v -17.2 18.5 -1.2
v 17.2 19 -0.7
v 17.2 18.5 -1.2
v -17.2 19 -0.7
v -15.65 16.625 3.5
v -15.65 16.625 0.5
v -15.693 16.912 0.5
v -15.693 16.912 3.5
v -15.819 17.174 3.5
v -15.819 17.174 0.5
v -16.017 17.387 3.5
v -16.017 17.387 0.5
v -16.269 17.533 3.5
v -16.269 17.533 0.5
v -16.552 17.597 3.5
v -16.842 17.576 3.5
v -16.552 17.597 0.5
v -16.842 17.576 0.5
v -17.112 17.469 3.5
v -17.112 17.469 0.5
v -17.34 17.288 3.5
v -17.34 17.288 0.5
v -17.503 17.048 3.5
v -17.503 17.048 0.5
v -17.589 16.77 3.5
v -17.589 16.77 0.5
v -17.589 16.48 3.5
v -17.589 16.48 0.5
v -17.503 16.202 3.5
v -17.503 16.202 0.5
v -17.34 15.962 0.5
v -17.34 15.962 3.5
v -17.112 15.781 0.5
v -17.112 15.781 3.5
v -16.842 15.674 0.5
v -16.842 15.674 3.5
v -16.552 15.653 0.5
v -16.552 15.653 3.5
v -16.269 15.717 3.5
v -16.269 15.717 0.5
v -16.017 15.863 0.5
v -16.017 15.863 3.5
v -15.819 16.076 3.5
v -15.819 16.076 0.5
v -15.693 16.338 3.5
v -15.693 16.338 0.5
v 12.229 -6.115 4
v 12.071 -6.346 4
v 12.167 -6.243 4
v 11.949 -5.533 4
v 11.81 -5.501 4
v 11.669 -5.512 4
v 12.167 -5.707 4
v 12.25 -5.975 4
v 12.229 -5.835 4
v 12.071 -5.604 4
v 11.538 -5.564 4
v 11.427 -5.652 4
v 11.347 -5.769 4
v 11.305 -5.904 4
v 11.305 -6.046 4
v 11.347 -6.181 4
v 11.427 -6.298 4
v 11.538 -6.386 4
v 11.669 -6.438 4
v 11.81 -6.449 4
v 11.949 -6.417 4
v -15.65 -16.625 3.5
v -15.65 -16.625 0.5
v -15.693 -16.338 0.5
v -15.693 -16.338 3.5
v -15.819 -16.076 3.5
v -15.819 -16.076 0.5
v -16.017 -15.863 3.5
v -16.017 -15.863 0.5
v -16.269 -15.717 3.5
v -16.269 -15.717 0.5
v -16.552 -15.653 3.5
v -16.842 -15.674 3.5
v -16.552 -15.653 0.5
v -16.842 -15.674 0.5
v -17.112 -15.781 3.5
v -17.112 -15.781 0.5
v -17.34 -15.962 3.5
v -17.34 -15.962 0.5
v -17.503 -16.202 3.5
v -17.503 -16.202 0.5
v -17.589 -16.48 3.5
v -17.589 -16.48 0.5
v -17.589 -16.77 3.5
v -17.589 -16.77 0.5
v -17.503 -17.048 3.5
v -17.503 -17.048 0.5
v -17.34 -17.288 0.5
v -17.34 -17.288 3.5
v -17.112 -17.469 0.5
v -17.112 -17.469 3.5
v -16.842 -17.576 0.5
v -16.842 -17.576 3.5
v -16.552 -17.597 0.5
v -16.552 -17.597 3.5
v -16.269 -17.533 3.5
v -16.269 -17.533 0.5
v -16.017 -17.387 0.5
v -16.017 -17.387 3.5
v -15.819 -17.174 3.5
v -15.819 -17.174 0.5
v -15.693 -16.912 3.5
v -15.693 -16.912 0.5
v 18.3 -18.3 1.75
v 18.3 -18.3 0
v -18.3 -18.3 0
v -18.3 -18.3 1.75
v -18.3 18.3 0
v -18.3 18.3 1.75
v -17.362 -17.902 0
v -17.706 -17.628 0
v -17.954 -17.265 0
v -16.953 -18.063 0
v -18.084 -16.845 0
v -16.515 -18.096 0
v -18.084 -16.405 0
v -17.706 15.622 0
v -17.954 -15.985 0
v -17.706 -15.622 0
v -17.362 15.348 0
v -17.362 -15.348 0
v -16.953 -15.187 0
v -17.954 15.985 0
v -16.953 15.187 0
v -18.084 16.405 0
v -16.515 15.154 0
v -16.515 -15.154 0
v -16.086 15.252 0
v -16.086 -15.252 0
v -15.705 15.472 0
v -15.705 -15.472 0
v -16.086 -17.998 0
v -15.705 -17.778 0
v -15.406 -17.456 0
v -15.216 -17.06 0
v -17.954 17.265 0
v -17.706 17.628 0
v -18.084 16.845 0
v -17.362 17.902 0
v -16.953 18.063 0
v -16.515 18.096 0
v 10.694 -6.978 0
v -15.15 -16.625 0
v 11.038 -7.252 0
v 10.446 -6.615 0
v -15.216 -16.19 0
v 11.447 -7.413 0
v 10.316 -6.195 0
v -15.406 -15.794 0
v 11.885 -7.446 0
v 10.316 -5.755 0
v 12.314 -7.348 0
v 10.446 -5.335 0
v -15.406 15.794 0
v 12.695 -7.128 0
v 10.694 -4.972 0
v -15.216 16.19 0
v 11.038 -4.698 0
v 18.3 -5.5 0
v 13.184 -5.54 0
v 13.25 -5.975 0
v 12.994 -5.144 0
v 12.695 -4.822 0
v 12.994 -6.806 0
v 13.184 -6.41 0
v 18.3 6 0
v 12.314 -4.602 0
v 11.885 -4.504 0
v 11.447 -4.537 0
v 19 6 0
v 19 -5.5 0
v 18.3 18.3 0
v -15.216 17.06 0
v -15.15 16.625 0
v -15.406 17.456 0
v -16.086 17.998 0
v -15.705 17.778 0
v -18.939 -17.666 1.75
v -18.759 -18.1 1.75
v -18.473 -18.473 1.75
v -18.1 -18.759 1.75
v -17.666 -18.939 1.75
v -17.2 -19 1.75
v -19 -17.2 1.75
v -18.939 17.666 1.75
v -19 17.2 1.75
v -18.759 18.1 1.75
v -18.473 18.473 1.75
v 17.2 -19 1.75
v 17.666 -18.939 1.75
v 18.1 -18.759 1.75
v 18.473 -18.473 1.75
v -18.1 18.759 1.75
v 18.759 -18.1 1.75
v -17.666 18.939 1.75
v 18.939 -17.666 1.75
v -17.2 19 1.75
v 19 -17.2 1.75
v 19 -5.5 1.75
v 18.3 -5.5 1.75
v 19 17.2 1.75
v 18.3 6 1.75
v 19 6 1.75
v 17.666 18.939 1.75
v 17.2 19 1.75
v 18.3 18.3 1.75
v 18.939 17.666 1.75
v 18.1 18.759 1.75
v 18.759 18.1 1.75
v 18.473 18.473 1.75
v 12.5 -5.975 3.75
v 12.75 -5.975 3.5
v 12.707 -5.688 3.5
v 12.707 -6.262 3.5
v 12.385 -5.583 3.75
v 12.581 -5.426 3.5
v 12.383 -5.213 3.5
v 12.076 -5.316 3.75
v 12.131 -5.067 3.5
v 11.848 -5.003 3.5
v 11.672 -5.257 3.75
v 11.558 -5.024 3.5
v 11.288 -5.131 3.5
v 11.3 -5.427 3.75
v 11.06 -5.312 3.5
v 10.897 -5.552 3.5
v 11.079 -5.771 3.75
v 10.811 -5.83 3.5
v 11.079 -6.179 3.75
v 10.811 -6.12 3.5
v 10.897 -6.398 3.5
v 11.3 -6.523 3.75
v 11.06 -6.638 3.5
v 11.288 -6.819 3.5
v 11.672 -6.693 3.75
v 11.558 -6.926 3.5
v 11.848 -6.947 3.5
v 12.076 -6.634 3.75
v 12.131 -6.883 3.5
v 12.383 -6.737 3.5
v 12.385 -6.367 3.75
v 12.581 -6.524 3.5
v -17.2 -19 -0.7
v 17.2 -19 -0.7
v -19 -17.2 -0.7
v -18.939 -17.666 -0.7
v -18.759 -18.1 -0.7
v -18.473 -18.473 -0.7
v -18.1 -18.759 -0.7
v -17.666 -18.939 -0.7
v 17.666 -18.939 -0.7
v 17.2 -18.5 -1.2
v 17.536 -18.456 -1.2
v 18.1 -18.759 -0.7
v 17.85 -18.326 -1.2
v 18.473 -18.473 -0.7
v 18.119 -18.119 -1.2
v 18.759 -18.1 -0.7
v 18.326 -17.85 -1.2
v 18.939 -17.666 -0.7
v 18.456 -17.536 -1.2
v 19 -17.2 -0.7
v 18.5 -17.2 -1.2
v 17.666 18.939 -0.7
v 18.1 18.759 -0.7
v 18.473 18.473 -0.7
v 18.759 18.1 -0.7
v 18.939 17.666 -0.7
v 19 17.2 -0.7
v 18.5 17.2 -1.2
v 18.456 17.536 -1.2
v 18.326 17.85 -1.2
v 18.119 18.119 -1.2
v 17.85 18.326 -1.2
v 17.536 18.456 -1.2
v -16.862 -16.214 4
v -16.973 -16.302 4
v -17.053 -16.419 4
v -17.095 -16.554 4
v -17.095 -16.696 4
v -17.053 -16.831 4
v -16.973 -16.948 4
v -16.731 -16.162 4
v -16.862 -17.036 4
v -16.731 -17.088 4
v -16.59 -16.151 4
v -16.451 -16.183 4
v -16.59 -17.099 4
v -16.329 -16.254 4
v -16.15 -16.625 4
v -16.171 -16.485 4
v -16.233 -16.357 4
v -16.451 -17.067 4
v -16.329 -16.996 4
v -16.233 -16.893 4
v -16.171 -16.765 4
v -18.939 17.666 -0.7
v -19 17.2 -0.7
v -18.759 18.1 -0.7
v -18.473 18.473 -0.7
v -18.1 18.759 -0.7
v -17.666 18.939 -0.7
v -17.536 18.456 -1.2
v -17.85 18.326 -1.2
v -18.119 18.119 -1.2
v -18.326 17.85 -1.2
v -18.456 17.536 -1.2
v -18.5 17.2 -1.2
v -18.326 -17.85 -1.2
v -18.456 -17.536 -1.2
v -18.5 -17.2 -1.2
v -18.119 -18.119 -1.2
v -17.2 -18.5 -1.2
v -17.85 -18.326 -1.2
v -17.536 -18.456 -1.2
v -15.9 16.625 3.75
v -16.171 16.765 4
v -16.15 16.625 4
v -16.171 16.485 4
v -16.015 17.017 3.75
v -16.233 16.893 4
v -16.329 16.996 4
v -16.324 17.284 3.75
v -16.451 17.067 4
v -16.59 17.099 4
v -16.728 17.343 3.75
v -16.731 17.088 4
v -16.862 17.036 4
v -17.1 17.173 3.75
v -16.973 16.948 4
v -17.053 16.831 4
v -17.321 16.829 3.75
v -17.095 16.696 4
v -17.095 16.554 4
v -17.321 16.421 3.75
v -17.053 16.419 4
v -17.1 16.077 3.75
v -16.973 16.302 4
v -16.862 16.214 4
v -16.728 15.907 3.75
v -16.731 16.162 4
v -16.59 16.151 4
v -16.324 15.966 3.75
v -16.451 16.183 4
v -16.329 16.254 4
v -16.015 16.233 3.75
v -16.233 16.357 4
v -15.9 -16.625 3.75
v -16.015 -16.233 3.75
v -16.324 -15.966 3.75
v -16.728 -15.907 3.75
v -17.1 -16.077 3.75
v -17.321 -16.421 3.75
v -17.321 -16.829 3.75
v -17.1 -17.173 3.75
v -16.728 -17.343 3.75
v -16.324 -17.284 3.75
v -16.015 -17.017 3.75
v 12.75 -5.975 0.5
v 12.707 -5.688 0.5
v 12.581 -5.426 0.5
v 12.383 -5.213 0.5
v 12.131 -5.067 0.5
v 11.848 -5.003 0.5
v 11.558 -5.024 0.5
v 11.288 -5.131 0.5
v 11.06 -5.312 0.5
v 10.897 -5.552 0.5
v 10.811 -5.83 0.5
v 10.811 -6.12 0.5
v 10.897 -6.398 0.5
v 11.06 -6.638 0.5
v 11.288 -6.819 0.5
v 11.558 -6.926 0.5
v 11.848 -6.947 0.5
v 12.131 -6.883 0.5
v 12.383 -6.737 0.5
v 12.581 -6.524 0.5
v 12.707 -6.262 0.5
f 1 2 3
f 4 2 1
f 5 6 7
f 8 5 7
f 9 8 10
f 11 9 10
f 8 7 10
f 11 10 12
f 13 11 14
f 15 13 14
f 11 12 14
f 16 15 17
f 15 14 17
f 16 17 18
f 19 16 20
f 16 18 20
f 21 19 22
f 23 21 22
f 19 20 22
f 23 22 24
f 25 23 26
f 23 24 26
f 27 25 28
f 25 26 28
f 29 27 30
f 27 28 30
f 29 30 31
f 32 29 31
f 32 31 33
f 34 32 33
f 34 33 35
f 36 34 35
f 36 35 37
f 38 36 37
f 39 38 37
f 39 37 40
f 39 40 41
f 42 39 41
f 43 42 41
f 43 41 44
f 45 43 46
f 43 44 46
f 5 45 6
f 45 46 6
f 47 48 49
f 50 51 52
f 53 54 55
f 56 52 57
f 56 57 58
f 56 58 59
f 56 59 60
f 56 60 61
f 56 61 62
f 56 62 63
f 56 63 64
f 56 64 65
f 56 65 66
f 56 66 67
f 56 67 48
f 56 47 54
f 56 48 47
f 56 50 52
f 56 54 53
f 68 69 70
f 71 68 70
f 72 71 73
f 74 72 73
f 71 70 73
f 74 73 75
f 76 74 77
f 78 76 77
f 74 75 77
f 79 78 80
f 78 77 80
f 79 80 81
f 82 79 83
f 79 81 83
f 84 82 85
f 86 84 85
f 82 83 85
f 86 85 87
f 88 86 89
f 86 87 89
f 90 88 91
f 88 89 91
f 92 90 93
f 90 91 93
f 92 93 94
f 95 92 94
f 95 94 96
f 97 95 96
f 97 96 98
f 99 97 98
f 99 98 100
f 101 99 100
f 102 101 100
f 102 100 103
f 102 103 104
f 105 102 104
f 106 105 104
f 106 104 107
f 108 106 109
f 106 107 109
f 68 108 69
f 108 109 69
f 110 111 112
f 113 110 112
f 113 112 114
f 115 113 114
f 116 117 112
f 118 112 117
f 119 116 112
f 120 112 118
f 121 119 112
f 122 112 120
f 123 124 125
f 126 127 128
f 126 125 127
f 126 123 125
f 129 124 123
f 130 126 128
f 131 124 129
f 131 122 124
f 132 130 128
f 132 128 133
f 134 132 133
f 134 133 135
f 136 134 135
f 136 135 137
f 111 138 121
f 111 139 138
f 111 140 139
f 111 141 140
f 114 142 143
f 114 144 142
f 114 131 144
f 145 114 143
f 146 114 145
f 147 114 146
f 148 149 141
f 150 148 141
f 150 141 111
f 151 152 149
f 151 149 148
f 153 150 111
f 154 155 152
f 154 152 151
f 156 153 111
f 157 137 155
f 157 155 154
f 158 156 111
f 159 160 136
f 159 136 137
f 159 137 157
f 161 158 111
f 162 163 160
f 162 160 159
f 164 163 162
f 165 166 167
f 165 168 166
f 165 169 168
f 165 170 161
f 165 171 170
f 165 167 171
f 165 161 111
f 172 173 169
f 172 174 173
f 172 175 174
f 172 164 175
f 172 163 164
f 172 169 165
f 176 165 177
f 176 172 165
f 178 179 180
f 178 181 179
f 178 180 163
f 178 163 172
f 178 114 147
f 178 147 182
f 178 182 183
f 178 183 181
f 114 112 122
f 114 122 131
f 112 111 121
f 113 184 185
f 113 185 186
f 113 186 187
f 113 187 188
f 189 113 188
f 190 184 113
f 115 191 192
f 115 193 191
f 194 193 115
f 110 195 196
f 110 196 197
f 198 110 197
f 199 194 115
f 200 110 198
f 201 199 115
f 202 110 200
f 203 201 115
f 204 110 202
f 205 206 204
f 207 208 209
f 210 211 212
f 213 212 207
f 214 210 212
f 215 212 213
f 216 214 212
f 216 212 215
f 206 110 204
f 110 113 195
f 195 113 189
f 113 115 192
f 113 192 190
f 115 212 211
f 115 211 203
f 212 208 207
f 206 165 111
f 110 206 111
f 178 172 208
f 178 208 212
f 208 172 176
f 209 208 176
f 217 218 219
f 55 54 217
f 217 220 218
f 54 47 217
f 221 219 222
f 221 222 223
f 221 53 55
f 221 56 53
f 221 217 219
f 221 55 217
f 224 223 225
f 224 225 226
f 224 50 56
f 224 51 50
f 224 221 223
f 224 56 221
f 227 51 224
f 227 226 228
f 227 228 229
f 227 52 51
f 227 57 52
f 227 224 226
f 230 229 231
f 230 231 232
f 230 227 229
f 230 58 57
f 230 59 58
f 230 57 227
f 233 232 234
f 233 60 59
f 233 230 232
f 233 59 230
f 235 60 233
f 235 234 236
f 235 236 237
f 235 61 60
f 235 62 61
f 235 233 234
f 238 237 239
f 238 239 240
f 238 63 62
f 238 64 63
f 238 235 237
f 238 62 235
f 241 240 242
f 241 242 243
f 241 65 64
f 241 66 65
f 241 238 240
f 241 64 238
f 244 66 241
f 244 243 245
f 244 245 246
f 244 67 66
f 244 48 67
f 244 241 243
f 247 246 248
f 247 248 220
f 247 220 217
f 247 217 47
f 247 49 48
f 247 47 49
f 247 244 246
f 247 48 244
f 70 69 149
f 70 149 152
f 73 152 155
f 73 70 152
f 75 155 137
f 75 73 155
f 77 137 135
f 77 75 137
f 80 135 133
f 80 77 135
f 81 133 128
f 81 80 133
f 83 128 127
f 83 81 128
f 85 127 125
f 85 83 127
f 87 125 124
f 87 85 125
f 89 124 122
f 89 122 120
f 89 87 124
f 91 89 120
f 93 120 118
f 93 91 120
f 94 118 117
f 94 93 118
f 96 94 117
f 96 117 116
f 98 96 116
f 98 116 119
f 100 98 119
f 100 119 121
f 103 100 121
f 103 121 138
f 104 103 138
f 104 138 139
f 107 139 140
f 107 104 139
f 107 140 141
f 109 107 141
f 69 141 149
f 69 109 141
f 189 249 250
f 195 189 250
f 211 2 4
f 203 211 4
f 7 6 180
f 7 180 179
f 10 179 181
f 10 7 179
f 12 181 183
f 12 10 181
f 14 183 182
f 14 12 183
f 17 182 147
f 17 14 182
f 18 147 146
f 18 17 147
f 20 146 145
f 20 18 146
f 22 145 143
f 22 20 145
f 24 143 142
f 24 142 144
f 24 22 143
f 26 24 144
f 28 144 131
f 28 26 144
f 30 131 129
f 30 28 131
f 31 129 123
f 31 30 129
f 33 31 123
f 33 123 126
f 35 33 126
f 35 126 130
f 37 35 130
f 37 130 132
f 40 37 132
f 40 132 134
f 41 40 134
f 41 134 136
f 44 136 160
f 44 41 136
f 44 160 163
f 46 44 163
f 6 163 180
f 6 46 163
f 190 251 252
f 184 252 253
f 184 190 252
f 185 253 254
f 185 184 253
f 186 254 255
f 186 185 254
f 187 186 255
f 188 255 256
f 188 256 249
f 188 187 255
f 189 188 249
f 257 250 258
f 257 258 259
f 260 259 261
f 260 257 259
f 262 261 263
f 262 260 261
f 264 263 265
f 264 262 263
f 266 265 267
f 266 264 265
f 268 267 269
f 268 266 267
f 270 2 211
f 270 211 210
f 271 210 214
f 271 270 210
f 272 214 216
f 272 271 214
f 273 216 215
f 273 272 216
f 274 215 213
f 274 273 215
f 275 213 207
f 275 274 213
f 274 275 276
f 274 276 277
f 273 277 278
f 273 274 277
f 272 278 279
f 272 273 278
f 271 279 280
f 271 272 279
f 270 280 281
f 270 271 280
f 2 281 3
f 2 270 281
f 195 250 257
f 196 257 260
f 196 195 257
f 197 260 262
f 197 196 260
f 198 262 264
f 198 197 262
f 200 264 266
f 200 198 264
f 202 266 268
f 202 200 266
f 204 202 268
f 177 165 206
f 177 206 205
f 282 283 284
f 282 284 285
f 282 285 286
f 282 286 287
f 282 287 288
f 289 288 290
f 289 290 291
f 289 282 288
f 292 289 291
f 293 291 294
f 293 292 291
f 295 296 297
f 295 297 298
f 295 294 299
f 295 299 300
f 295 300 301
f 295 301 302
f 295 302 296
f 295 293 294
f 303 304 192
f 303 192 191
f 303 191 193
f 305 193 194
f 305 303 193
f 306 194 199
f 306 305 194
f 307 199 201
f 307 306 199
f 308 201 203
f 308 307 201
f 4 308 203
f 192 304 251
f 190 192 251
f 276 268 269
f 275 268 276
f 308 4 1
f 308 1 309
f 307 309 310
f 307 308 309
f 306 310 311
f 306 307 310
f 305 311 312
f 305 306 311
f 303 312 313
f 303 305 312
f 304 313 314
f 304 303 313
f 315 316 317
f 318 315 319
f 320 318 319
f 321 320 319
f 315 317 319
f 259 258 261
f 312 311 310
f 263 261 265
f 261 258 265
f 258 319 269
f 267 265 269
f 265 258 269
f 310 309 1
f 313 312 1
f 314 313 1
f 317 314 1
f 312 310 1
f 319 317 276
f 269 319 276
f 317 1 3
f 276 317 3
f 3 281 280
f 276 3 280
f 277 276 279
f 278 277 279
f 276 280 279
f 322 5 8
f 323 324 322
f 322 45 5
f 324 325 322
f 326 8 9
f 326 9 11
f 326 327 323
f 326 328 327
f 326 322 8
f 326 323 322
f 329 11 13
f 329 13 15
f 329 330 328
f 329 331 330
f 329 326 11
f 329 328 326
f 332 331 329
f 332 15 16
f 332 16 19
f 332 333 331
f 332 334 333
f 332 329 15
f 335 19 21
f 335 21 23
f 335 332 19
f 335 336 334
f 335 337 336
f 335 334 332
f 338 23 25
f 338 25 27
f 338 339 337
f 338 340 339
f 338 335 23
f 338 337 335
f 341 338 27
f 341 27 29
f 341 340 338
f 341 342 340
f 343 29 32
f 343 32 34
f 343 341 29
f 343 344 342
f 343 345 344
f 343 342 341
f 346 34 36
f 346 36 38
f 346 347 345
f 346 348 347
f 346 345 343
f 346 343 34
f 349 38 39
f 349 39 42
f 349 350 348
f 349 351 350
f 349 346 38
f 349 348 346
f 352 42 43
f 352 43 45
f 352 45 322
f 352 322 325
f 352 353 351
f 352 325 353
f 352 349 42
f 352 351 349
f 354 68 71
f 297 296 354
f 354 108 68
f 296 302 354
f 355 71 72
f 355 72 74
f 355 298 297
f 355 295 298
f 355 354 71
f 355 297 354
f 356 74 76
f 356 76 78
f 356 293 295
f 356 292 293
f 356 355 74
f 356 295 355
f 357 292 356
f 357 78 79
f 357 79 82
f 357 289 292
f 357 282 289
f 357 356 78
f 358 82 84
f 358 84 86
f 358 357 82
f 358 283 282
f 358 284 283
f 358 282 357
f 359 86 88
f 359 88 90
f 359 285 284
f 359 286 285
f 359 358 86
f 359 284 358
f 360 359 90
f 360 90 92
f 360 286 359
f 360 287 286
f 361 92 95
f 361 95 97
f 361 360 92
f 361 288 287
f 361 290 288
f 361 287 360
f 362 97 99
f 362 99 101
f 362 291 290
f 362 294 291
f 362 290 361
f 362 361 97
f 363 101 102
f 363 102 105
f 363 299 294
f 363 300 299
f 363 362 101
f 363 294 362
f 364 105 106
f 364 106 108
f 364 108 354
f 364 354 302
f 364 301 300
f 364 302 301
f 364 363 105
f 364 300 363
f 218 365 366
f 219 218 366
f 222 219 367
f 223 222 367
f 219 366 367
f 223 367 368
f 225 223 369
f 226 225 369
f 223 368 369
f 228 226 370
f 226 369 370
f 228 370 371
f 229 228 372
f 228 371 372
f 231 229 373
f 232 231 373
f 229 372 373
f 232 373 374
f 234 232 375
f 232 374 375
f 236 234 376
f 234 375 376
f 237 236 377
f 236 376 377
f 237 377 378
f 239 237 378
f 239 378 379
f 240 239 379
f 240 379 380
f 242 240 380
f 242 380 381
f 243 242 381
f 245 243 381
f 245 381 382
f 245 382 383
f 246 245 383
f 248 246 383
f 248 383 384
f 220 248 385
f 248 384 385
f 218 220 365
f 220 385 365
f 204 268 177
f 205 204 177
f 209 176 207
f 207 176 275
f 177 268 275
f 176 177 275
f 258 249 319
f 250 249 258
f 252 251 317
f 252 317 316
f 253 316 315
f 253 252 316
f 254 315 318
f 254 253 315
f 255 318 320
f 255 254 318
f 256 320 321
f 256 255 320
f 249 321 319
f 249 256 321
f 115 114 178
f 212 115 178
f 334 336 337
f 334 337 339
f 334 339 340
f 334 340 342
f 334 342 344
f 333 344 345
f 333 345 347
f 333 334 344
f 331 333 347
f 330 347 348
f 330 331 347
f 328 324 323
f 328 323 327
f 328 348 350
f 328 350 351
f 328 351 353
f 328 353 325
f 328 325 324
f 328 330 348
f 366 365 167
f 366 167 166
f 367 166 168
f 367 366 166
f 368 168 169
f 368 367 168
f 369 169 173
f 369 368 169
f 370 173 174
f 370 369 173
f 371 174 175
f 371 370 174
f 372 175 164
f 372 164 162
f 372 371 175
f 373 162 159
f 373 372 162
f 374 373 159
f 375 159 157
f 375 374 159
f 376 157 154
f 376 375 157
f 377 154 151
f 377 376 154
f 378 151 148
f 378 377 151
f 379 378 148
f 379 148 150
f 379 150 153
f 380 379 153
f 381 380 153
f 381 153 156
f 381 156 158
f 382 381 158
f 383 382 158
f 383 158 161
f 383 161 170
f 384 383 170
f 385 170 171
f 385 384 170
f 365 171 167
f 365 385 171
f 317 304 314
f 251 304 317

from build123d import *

# Parameters (mm, degrees)
F0_R     = 0.975
F0_W     = 36.6
F0_H     = 0.7
F0_W_2   = 0.7
F0_H_2   = 36.6
F0_H_3   = 12.8
F0_H_4   = 12.3
F0_H_5   = 11.5
F1_DEPTH = 1.2
F2_DEPTH = 1.75
F3_DEPTH = 4
F4_R     = 1.8
F5_SIZE  = 0.5


with BuildPart() as f1:
    # F0 (on Top) → F1 (new body)
    with BuildSketch(Plane.XY):
        Polygon((18.3, 6), (18.3, 18.3), (-18.3, 18.3), (-18.3, -18.3), (18.3, -18.3), (18.3, -5.5), align=None)
        with Locations((-16.625, -16.625)):
            Circle(F0_R, mode=Mode.SUBTRACT)
        with Locations((11.775, -5.975)):
            Circle(F0_R, mode=Mode.SUBTRACT)
        with Locations((-16.625, 16.625)):
            Circle(F0_R, mode=Mode.SUBTRACT)
        with Locations((0, 18.65)):
            Rectangle(F0_W, F0_H)
        with Locations((0, -18.65)):
            Rectangle(F0_W, F0_H)
        with Locations((-18.65, 0)):
            Rectangle(F0_W_2, F0_H_2)
        with Locations((18.65, -11.9)):
            Rectangle(F0_W_2, F0_H_3)
        with Locations((18.65, 12.15)):
            Rectangle(F0_W_2, F0_H_4)
        with Locations((18.65, 0.25)):
            Rectangle(F0_W_2, F0_H_5)
        with Locations((11.775, -5.975)):
            Circle(F0_R)
        with Locations((-16.625, -16.625)):
            Circle(F0_R)
        with Locations((-16.625, 16.625)):
            Circle(F0_R)
        with Locations((18.65, 18.65)):
            Rectangle(F0_W_2, F0_H)
        with Locations((-18.65, 18.65)):
            Rectangle(F0_W_2, F0_H)
        with Locations((18.65, -18.65)):
            Rectangle(F0_W_2, F0_H)
        with Locations((-18.65, -18.65)):
            Rectangle(F0_W_2, F0_H)
    extrude(amount=-F1_DEPTH)

    # F0 (on Top) → F2 (join)
    with BuildSketch(Plane.XY):
        with Locations((0, 18.65)):
            Rectangle(F0_W, F0_H)
        with Locations((-18.65, 18.65)):
            Rectangle(F0_W_2, F0_H)
        with Locations((18.65, 18.65)):
            Rectangle(F0_W_2, F0_H)
        with Locations((18.65, 12.15)):
            Rectangle(F0_W_2, F0_H_4)
        with Locations((18.65, -11.9)):
            Rectangle(F0_W_2, F0_H_3)
        with Locations((18.65, -18.65)):
            Rectangle(F0_W_2, F0_H)
        with Locations((0, -18.65)):
            Rectangle(F0_W, F0_H)
        with Locations((-18.65, -18.65)):
            Rectangle(F0_W_2, F0_H)
        with Locations((-18.65, 0)):
            Rectangle(F0_W_2, F0_H_2)
    extrude(amount=F2_DEPTH)

    # F0 (on Top) → F3 (join)
    with BuildSketch(Plane.XY):
        with Locations((-16.625, 16.625)):
            Circle(F0_R)
        with Locations((-16.625, -16.625)):
            Circle(F0_R)
        with Locations((11.775, -5.975)):
            Circle(F0_R)
    extrude(amount=F3_DEPTH)

    # F4
    f4_edges = [f1.edges().sort_by_distance(p)[0] for p in [
        (-19, 19, 0.275),
        (19, 19, 0.275),
        (-19, -19, 0.275),
        (19, -19, 0.275),
    ]]
    fillet(f4_edges, radius=F4_R)

    # F5
    f5_edges = [f1.edges().sort_by_distance(p)[0] for p in [
        (0, -19, -1.2),
        (10.8, -5.975, 4),
        (-17.6, 16.625, 4),
        (-17.6, -16.625, 4),
        (-17.6, 16.625, 0),
        (10.8, -5.975, 0),
        (-17.6, -16.625, 0),
    ]]
    chamfer(f5_edges, length=F5_SIZE)


solid = f1.part
